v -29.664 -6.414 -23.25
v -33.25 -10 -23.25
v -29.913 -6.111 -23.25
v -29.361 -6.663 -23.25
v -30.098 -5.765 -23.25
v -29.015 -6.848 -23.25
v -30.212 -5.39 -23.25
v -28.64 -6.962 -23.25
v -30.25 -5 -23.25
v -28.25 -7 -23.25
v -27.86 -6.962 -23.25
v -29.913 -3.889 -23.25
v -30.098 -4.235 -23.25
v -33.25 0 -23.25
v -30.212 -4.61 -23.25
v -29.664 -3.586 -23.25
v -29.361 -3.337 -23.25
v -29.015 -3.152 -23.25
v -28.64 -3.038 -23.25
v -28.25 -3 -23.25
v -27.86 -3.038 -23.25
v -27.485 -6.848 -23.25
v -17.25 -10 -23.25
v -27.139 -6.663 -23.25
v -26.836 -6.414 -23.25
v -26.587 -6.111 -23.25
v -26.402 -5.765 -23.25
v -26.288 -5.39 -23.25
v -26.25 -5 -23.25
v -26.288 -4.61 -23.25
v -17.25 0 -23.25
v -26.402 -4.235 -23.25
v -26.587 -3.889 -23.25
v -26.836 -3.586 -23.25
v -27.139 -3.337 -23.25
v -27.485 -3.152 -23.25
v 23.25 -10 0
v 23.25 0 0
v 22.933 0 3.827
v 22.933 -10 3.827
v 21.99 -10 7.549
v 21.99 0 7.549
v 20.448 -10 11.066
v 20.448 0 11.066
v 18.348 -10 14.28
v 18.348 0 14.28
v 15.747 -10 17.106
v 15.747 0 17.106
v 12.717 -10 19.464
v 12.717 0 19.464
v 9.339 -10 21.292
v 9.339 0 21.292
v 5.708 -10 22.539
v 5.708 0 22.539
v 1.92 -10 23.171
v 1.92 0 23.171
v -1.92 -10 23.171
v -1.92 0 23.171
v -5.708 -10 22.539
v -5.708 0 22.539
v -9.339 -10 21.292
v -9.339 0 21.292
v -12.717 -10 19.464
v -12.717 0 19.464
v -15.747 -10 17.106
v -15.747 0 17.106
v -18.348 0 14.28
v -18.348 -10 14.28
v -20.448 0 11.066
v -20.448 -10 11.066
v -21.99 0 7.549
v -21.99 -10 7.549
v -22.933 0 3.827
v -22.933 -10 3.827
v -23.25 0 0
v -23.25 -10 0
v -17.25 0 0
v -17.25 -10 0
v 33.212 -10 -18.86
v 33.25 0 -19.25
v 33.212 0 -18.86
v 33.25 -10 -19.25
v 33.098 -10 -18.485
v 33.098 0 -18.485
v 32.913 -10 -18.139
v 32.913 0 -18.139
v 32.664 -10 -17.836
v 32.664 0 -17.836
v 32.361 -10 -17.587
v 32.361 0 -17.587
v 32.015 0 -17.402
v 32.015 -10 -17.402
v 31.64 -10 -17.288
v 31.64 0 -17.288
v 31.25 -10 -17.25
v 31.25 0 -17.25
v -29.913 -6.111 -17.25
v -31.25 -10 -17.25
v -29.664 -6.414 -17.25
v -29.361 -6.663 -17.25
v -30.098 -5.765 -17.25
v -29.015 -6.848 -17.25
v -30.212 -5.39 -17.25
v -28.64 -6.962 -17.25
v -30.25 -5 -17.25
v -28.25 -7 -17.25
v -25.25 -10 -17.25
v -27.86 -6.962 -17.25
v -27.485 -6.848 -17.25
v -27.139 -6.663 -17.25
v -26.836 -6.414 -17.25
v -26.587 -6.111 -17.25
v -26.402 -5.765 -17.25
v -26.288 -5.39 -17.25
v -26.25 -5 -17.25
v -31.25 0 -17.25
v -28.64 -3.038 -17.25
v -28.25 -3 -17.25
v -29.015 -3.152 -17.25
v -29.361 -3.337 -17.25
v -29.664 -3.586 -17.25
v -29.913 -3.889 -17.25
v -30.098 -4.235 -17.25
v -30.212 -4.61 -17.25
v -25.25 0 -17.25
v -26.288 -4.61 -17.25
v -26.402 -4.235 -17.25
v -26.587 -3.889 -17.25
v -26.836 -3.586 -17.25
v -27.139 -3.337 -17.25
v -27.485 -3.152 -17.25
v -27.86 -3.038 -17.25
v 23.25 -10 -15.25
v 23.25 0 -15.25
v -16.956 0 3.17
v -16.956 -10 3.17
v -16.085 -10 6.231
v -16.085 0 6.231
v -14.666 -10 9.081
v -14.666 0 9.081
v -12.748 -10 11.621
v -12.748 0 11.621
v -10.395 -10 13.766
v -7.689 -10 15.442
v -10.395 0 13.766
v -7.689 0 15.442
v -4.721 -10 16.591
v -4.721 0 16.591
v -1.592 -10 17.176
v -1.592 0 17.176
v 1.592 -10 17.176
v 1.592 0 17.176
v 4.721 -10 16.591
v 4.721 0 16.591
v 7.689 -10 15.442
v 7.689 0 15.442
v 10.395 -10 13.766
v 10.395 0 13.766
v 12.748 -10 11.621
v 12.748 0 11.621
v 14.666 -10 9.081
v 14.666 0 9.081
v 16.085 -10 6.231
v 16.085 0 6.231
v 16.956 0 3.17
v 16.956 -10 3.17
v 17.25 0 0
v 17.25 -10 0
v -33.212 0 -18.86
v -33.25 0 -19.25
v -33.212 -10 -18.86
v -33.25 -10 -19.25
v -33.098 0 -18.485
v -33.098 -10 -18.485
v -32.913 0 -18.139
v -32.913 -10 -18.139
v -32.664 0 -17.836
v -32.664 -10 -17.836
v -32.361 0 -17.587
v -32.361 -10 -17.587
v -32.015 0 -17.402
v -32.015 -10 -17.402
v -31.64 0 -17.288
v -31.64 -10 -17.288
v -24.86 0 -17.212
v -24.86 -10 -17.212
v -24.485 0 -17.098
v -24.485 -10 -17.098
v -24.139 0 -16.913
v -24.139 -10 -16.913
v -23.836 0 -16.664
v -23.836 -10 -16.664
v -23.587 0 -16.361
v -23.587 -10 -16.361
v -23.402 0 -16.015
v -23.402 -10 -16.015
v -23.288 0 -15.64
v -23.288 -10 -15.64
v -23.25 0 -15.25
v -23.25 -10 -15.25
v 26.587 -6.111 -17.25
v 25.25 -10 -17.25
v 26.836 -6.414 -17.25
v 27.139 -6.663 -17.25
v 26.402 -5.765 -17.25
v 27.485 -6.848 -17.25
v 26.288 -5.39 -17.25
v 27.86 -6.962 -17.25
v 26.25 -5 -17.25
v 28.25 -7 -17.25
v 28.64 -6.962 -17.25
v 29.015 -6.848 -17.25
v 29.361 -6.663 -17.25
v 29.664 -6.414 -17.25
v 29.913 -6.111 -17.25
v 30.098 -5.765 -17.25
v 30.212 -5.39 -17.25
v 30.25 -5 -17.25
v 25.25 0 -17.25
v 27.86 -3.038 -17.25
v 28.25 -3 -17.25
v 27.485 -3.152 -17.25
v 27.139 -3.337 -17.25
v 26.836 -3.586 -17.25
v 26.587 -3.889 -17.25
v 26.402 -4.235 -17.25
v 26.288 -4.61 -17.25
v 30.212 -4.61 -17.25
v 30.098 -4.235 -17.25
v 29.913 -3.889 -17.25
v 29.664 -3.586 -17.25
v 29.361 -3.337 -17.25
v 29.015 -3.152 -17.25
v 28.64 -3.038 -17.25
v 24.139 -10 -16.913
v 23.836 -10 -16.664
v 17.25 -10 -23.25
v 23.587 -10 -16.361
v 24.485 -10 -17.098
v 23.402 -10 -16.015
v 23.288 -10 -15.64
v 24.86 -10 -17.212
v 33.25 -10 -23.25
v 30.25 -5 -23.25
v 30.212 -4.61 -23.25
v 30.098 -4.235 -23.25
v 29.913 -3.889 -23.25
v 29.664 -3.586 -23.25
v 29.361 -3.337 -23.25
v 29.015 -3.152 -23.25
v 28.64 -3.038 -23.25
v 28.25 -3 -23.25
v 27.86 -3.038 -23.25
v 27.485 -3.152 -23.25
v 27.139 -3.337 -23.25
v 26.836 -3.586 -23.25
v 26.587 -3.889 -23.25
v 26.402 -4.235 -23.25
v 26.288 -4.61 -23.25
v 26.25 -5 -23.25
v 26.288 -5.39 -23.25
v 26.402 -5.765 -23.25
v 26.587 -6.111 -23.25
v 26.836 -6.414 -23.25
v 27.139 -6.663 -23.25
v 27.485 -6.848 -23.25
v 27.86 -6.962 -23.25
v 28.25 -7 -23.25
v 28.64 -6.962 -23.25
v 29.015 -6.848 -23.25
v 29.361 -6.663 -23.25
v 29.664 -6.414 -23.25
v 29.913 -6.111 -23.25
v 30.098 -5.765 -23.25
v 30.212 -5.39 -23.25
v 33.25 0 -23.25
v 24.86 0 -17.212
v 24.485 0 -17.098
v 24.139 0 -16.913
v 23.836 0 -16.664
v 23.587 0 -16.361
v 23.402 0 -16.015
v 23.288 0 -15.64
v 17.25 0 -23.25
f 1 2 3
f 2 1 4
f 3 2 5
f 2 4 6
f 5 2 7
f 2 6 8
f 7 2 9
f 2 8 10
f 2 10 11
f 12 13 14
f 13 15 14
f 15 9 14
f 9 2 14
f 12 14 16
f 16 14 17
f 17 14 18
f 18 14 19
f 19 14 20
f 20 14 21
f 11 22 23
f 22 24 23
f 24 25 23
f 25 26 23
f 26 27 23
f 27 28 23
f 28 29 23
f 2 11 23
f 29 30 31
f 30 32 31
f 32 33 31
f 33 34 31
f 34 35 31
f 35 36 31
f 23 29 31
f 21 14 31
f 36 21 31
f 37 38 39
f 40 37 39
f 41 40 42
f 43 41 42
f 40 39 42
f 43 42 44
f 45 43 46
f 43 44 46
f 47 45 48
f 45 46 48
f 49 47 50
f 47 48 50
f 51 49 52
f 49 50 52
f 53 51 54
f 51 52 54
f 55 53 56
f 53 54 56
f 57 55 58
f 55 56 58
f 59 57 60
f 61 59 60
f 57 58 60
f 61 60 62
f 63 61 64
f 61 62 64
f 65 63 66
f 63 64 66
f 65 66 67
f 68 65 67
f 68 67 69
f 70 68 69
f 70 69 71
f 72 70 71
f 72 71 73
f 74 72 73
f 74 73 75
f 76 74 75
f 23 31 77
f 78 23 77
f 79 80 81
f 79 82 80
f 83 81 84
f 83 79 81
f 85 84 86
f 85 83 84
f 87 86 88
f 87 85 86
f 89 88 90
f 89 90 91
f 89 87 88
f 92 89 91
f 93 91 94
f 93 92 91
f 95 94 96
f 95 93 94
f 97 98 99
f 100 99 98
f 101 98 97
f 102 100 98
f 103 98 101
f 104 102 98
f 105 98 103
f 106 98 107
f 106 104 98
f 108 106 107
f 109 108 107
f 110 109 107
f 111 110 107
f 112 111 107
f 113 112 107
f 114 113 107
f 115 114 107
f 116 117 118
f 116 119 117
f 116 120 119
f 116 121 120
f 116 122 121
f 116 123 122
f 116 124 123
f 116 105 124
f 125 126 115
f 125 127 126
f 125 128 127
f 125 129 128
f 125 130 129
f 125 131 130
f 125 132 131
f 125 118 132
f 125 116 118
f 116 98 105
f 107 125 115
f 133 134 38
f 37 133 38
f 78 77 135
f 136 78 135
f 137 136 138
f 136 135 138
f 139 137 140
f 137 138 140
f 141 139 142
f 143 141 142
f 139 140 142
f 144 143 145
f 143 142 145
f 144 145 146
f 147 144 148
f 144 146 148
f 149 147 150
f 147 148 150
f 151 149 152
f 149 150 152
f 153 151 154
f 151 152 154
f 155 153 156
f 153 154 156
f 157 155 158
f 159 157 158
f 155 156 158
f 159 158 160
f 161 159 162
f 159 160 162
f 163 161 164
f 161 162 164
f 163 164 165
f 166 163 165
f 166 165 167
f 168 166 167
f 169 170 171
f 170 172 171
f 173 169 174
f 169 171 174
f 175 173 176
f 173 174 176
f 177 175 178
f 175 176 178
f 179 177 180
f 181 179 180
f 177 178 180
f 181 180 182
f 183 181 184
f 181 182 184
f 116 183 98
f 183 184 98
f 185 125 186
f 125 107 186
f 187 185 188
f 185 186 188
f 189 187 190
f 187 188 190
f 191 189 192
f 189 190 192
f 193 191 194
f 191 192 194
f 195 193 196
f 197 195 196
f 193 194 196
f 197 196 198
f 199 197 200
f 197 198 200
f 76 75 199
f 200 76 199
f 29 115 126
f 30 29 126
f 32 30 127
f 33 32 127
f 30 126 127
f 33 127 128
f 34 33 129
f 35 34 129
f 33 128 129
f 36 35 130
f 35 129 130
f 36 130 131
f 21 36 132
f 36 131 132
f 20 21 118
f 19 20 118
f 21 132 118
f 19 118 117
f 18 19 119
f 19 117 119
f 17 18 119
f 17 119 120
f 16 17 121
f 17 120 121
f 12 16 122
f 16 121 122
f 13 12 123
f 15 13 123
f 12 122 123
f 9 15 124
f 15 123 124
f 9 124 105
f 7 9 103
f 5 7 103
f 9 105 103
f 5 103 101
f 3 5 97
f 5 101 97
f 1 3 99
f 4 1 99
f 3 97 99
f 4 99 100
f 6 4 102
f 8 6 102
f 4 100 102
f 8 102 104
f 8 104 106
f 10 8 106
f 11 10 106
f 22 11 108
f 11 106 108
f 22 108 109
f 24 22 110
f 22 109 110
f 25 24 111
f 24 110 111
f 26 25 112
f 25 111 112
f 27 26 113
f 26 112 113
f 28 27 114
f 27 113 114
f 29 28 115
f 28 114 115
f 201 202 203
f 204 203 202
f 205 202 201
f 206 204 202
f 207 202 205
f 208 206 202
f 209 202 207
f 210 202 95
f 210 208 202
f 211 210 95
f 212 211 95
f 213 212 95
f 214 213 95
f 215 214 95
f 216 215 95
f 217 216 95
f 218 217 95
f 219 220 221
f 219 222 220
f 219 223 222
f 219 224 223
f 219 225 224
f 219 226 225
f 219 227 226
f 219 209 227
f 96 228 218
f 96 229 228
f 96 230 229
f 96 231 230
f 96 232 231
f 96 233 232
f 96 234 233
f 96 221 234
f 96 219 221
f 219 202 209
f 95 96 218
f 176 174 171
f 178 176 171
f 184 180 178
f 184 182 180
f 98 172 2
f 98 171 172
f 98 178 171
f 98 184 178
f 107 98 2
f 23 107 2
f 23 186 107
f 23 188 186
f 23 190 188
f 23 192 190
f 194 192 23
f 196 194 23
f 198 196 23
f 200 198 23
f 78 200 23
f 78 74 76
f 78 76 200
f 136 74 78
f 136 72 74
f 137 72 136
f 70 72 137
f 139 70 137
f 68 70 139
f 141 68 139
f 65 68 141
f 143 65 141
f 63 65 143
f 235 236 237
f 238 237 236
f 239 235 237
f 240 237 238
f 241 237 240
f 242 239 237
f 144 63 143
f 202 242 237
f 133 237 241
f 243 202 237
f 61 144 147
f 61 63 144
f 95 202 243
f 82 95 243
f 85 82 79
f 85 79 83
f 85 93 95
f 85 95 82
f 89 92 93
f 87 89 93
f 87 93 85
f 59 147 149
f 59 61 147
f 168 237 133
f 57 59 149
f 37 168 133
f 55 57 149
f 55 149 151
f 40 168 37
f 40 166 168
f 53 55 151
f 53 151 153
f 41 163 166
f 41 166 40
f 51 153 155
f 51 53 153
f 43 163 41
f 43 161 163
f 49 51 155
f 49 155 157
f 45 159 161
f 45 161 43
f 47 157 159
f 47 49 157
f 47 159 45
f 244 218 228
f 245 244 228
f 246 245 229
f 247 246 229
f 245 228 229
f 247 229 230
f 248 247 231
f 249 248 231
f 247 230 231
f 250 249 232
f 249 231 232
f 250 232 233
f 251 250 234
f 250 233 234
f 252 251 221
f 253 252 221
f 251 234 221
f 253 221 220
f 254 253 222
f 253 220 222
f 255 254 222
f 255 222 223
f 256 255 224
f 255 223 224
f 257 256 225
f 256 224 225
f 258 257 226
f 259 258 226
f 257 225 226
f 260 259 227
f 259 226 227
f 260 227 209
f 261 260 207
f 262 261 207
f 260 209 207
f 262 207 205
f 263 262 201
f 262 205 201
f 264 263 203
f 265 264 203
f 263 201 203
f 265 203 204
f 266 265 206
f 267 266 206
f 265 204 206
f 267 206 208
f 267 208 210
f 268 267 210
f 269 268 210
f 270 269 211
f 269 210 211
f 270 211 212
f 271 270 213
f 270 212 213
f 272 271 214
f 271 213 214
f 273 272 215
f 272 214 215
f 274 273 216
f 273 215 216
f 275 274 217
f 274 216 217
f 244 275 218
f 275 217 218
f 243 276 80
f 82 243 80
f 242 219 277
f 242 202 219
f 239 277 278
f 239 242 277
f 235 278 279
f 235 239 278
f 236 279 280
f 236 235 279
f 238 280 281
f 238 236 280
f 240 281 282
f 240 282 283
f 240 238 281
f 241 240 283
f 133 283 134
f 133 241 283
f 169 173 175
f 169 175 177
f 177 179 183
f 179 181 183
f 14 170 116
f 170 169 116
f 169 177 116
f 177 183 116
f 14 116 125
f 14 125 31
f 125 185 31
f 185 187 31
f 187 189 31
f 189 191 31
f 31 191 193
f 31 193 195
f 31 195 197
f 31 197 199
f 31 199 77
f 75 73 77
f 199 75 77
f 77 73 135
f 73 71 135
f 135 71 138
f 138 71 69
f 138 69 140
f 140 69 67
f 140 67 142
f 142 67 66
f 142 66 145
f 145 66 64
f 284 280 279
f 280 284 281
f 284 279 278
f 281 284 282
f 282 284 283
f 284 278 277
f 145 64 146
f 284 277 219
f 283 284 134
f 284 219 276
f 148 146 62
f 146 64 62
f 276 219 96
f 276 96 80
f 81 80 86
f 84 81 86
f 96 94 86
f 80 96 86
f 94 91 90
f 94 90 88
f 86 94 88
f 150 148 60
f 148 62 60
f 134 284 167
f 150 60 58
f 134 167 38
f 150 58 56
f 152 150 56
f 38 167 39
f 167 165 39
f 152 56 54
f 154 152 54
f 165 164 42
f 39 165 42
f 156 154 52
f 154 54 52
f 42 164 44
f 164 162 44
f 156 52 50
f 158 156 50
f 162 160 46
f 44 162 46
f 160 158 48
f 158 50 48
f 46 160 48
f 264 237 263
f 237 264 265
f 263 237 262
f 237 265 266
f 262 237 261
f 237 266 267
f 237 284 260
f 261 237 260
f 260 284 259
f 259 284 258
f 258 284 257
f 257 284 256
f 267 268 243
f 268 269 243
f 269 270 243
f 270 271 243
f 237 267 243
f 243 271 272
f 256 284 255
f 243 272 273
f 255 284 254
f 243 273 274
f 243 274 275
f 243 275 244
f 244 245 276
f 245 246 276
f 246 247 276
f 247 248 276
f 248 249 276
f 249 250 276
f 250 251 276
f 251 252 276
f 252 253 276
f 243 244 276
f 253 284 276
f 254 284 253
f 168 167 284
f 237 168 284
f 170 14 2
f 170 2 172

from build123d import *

# Parameters (mm, degrees)
F0_W     = 10
F0_H     = 6
F1_DEPTH = 10
F2_R     = 2
F3_DEPTH = 6
F4_R     = 2


with BuildPart() as f1:
    # F0 (on Front) → F1 (new body)
    with BuildSketch(Plane.XZ):
        with Locations((-28.25, -20.25)):
            Rectangle(F0_W, F0_H)
        with Locations((28.25, -20.25)):
            Rectangle(F0_W, F0_H)
        with BuildLine():
            ThreePointArc((-17.25, 0), (0, 17.25), (17.25, 0))
            Line((17.25, 0), (17.25, -23.25))
            Line((17.25, -23.25), (23.25, -23.25))
            Line((23.25, -23.25), (23.25, -17.25))
            Line((23.25, -17.25), (23.25, 0))
            ThreePointArc((23.25, 0), (0, 23.25), (-23.25, 0))
            Line((-23.25, 0), (-23.25, -17.25))
            Line((-23.25, -17.25), (-23.25, -23.25))
            Line((-23.25, -23.25), (-17.25, -23.25))
            Line((-17.25, -23.25), (-17.25, 0))
        make_face()
    extrude(amount=F1_DEPTH)

    # F2 (on face) → F3 (cut, through all)
    with BuildSketch(Plane.XY.offset(-17.25)):
        with Locations((-28.25, -5)):
            Circle(F2_R)
        with Locations((28.25, -5)):
            Circle(F2_R)
    extrude(amount=-F3_DEPTH, mode=Mode.SUBTRACT)

    # F4
    f4_edges = [f1.edges().sort_by_distance(p)[0] for p in [
        (-23.25, -5, -17.25),
        (23.25, -5, -17.25),
        (33.25, -5, -17.25),
        (-33.25, -5, -17.25),
    ]]
    fillet(f4_edges, radius=F4_R)


solid = f1.part
